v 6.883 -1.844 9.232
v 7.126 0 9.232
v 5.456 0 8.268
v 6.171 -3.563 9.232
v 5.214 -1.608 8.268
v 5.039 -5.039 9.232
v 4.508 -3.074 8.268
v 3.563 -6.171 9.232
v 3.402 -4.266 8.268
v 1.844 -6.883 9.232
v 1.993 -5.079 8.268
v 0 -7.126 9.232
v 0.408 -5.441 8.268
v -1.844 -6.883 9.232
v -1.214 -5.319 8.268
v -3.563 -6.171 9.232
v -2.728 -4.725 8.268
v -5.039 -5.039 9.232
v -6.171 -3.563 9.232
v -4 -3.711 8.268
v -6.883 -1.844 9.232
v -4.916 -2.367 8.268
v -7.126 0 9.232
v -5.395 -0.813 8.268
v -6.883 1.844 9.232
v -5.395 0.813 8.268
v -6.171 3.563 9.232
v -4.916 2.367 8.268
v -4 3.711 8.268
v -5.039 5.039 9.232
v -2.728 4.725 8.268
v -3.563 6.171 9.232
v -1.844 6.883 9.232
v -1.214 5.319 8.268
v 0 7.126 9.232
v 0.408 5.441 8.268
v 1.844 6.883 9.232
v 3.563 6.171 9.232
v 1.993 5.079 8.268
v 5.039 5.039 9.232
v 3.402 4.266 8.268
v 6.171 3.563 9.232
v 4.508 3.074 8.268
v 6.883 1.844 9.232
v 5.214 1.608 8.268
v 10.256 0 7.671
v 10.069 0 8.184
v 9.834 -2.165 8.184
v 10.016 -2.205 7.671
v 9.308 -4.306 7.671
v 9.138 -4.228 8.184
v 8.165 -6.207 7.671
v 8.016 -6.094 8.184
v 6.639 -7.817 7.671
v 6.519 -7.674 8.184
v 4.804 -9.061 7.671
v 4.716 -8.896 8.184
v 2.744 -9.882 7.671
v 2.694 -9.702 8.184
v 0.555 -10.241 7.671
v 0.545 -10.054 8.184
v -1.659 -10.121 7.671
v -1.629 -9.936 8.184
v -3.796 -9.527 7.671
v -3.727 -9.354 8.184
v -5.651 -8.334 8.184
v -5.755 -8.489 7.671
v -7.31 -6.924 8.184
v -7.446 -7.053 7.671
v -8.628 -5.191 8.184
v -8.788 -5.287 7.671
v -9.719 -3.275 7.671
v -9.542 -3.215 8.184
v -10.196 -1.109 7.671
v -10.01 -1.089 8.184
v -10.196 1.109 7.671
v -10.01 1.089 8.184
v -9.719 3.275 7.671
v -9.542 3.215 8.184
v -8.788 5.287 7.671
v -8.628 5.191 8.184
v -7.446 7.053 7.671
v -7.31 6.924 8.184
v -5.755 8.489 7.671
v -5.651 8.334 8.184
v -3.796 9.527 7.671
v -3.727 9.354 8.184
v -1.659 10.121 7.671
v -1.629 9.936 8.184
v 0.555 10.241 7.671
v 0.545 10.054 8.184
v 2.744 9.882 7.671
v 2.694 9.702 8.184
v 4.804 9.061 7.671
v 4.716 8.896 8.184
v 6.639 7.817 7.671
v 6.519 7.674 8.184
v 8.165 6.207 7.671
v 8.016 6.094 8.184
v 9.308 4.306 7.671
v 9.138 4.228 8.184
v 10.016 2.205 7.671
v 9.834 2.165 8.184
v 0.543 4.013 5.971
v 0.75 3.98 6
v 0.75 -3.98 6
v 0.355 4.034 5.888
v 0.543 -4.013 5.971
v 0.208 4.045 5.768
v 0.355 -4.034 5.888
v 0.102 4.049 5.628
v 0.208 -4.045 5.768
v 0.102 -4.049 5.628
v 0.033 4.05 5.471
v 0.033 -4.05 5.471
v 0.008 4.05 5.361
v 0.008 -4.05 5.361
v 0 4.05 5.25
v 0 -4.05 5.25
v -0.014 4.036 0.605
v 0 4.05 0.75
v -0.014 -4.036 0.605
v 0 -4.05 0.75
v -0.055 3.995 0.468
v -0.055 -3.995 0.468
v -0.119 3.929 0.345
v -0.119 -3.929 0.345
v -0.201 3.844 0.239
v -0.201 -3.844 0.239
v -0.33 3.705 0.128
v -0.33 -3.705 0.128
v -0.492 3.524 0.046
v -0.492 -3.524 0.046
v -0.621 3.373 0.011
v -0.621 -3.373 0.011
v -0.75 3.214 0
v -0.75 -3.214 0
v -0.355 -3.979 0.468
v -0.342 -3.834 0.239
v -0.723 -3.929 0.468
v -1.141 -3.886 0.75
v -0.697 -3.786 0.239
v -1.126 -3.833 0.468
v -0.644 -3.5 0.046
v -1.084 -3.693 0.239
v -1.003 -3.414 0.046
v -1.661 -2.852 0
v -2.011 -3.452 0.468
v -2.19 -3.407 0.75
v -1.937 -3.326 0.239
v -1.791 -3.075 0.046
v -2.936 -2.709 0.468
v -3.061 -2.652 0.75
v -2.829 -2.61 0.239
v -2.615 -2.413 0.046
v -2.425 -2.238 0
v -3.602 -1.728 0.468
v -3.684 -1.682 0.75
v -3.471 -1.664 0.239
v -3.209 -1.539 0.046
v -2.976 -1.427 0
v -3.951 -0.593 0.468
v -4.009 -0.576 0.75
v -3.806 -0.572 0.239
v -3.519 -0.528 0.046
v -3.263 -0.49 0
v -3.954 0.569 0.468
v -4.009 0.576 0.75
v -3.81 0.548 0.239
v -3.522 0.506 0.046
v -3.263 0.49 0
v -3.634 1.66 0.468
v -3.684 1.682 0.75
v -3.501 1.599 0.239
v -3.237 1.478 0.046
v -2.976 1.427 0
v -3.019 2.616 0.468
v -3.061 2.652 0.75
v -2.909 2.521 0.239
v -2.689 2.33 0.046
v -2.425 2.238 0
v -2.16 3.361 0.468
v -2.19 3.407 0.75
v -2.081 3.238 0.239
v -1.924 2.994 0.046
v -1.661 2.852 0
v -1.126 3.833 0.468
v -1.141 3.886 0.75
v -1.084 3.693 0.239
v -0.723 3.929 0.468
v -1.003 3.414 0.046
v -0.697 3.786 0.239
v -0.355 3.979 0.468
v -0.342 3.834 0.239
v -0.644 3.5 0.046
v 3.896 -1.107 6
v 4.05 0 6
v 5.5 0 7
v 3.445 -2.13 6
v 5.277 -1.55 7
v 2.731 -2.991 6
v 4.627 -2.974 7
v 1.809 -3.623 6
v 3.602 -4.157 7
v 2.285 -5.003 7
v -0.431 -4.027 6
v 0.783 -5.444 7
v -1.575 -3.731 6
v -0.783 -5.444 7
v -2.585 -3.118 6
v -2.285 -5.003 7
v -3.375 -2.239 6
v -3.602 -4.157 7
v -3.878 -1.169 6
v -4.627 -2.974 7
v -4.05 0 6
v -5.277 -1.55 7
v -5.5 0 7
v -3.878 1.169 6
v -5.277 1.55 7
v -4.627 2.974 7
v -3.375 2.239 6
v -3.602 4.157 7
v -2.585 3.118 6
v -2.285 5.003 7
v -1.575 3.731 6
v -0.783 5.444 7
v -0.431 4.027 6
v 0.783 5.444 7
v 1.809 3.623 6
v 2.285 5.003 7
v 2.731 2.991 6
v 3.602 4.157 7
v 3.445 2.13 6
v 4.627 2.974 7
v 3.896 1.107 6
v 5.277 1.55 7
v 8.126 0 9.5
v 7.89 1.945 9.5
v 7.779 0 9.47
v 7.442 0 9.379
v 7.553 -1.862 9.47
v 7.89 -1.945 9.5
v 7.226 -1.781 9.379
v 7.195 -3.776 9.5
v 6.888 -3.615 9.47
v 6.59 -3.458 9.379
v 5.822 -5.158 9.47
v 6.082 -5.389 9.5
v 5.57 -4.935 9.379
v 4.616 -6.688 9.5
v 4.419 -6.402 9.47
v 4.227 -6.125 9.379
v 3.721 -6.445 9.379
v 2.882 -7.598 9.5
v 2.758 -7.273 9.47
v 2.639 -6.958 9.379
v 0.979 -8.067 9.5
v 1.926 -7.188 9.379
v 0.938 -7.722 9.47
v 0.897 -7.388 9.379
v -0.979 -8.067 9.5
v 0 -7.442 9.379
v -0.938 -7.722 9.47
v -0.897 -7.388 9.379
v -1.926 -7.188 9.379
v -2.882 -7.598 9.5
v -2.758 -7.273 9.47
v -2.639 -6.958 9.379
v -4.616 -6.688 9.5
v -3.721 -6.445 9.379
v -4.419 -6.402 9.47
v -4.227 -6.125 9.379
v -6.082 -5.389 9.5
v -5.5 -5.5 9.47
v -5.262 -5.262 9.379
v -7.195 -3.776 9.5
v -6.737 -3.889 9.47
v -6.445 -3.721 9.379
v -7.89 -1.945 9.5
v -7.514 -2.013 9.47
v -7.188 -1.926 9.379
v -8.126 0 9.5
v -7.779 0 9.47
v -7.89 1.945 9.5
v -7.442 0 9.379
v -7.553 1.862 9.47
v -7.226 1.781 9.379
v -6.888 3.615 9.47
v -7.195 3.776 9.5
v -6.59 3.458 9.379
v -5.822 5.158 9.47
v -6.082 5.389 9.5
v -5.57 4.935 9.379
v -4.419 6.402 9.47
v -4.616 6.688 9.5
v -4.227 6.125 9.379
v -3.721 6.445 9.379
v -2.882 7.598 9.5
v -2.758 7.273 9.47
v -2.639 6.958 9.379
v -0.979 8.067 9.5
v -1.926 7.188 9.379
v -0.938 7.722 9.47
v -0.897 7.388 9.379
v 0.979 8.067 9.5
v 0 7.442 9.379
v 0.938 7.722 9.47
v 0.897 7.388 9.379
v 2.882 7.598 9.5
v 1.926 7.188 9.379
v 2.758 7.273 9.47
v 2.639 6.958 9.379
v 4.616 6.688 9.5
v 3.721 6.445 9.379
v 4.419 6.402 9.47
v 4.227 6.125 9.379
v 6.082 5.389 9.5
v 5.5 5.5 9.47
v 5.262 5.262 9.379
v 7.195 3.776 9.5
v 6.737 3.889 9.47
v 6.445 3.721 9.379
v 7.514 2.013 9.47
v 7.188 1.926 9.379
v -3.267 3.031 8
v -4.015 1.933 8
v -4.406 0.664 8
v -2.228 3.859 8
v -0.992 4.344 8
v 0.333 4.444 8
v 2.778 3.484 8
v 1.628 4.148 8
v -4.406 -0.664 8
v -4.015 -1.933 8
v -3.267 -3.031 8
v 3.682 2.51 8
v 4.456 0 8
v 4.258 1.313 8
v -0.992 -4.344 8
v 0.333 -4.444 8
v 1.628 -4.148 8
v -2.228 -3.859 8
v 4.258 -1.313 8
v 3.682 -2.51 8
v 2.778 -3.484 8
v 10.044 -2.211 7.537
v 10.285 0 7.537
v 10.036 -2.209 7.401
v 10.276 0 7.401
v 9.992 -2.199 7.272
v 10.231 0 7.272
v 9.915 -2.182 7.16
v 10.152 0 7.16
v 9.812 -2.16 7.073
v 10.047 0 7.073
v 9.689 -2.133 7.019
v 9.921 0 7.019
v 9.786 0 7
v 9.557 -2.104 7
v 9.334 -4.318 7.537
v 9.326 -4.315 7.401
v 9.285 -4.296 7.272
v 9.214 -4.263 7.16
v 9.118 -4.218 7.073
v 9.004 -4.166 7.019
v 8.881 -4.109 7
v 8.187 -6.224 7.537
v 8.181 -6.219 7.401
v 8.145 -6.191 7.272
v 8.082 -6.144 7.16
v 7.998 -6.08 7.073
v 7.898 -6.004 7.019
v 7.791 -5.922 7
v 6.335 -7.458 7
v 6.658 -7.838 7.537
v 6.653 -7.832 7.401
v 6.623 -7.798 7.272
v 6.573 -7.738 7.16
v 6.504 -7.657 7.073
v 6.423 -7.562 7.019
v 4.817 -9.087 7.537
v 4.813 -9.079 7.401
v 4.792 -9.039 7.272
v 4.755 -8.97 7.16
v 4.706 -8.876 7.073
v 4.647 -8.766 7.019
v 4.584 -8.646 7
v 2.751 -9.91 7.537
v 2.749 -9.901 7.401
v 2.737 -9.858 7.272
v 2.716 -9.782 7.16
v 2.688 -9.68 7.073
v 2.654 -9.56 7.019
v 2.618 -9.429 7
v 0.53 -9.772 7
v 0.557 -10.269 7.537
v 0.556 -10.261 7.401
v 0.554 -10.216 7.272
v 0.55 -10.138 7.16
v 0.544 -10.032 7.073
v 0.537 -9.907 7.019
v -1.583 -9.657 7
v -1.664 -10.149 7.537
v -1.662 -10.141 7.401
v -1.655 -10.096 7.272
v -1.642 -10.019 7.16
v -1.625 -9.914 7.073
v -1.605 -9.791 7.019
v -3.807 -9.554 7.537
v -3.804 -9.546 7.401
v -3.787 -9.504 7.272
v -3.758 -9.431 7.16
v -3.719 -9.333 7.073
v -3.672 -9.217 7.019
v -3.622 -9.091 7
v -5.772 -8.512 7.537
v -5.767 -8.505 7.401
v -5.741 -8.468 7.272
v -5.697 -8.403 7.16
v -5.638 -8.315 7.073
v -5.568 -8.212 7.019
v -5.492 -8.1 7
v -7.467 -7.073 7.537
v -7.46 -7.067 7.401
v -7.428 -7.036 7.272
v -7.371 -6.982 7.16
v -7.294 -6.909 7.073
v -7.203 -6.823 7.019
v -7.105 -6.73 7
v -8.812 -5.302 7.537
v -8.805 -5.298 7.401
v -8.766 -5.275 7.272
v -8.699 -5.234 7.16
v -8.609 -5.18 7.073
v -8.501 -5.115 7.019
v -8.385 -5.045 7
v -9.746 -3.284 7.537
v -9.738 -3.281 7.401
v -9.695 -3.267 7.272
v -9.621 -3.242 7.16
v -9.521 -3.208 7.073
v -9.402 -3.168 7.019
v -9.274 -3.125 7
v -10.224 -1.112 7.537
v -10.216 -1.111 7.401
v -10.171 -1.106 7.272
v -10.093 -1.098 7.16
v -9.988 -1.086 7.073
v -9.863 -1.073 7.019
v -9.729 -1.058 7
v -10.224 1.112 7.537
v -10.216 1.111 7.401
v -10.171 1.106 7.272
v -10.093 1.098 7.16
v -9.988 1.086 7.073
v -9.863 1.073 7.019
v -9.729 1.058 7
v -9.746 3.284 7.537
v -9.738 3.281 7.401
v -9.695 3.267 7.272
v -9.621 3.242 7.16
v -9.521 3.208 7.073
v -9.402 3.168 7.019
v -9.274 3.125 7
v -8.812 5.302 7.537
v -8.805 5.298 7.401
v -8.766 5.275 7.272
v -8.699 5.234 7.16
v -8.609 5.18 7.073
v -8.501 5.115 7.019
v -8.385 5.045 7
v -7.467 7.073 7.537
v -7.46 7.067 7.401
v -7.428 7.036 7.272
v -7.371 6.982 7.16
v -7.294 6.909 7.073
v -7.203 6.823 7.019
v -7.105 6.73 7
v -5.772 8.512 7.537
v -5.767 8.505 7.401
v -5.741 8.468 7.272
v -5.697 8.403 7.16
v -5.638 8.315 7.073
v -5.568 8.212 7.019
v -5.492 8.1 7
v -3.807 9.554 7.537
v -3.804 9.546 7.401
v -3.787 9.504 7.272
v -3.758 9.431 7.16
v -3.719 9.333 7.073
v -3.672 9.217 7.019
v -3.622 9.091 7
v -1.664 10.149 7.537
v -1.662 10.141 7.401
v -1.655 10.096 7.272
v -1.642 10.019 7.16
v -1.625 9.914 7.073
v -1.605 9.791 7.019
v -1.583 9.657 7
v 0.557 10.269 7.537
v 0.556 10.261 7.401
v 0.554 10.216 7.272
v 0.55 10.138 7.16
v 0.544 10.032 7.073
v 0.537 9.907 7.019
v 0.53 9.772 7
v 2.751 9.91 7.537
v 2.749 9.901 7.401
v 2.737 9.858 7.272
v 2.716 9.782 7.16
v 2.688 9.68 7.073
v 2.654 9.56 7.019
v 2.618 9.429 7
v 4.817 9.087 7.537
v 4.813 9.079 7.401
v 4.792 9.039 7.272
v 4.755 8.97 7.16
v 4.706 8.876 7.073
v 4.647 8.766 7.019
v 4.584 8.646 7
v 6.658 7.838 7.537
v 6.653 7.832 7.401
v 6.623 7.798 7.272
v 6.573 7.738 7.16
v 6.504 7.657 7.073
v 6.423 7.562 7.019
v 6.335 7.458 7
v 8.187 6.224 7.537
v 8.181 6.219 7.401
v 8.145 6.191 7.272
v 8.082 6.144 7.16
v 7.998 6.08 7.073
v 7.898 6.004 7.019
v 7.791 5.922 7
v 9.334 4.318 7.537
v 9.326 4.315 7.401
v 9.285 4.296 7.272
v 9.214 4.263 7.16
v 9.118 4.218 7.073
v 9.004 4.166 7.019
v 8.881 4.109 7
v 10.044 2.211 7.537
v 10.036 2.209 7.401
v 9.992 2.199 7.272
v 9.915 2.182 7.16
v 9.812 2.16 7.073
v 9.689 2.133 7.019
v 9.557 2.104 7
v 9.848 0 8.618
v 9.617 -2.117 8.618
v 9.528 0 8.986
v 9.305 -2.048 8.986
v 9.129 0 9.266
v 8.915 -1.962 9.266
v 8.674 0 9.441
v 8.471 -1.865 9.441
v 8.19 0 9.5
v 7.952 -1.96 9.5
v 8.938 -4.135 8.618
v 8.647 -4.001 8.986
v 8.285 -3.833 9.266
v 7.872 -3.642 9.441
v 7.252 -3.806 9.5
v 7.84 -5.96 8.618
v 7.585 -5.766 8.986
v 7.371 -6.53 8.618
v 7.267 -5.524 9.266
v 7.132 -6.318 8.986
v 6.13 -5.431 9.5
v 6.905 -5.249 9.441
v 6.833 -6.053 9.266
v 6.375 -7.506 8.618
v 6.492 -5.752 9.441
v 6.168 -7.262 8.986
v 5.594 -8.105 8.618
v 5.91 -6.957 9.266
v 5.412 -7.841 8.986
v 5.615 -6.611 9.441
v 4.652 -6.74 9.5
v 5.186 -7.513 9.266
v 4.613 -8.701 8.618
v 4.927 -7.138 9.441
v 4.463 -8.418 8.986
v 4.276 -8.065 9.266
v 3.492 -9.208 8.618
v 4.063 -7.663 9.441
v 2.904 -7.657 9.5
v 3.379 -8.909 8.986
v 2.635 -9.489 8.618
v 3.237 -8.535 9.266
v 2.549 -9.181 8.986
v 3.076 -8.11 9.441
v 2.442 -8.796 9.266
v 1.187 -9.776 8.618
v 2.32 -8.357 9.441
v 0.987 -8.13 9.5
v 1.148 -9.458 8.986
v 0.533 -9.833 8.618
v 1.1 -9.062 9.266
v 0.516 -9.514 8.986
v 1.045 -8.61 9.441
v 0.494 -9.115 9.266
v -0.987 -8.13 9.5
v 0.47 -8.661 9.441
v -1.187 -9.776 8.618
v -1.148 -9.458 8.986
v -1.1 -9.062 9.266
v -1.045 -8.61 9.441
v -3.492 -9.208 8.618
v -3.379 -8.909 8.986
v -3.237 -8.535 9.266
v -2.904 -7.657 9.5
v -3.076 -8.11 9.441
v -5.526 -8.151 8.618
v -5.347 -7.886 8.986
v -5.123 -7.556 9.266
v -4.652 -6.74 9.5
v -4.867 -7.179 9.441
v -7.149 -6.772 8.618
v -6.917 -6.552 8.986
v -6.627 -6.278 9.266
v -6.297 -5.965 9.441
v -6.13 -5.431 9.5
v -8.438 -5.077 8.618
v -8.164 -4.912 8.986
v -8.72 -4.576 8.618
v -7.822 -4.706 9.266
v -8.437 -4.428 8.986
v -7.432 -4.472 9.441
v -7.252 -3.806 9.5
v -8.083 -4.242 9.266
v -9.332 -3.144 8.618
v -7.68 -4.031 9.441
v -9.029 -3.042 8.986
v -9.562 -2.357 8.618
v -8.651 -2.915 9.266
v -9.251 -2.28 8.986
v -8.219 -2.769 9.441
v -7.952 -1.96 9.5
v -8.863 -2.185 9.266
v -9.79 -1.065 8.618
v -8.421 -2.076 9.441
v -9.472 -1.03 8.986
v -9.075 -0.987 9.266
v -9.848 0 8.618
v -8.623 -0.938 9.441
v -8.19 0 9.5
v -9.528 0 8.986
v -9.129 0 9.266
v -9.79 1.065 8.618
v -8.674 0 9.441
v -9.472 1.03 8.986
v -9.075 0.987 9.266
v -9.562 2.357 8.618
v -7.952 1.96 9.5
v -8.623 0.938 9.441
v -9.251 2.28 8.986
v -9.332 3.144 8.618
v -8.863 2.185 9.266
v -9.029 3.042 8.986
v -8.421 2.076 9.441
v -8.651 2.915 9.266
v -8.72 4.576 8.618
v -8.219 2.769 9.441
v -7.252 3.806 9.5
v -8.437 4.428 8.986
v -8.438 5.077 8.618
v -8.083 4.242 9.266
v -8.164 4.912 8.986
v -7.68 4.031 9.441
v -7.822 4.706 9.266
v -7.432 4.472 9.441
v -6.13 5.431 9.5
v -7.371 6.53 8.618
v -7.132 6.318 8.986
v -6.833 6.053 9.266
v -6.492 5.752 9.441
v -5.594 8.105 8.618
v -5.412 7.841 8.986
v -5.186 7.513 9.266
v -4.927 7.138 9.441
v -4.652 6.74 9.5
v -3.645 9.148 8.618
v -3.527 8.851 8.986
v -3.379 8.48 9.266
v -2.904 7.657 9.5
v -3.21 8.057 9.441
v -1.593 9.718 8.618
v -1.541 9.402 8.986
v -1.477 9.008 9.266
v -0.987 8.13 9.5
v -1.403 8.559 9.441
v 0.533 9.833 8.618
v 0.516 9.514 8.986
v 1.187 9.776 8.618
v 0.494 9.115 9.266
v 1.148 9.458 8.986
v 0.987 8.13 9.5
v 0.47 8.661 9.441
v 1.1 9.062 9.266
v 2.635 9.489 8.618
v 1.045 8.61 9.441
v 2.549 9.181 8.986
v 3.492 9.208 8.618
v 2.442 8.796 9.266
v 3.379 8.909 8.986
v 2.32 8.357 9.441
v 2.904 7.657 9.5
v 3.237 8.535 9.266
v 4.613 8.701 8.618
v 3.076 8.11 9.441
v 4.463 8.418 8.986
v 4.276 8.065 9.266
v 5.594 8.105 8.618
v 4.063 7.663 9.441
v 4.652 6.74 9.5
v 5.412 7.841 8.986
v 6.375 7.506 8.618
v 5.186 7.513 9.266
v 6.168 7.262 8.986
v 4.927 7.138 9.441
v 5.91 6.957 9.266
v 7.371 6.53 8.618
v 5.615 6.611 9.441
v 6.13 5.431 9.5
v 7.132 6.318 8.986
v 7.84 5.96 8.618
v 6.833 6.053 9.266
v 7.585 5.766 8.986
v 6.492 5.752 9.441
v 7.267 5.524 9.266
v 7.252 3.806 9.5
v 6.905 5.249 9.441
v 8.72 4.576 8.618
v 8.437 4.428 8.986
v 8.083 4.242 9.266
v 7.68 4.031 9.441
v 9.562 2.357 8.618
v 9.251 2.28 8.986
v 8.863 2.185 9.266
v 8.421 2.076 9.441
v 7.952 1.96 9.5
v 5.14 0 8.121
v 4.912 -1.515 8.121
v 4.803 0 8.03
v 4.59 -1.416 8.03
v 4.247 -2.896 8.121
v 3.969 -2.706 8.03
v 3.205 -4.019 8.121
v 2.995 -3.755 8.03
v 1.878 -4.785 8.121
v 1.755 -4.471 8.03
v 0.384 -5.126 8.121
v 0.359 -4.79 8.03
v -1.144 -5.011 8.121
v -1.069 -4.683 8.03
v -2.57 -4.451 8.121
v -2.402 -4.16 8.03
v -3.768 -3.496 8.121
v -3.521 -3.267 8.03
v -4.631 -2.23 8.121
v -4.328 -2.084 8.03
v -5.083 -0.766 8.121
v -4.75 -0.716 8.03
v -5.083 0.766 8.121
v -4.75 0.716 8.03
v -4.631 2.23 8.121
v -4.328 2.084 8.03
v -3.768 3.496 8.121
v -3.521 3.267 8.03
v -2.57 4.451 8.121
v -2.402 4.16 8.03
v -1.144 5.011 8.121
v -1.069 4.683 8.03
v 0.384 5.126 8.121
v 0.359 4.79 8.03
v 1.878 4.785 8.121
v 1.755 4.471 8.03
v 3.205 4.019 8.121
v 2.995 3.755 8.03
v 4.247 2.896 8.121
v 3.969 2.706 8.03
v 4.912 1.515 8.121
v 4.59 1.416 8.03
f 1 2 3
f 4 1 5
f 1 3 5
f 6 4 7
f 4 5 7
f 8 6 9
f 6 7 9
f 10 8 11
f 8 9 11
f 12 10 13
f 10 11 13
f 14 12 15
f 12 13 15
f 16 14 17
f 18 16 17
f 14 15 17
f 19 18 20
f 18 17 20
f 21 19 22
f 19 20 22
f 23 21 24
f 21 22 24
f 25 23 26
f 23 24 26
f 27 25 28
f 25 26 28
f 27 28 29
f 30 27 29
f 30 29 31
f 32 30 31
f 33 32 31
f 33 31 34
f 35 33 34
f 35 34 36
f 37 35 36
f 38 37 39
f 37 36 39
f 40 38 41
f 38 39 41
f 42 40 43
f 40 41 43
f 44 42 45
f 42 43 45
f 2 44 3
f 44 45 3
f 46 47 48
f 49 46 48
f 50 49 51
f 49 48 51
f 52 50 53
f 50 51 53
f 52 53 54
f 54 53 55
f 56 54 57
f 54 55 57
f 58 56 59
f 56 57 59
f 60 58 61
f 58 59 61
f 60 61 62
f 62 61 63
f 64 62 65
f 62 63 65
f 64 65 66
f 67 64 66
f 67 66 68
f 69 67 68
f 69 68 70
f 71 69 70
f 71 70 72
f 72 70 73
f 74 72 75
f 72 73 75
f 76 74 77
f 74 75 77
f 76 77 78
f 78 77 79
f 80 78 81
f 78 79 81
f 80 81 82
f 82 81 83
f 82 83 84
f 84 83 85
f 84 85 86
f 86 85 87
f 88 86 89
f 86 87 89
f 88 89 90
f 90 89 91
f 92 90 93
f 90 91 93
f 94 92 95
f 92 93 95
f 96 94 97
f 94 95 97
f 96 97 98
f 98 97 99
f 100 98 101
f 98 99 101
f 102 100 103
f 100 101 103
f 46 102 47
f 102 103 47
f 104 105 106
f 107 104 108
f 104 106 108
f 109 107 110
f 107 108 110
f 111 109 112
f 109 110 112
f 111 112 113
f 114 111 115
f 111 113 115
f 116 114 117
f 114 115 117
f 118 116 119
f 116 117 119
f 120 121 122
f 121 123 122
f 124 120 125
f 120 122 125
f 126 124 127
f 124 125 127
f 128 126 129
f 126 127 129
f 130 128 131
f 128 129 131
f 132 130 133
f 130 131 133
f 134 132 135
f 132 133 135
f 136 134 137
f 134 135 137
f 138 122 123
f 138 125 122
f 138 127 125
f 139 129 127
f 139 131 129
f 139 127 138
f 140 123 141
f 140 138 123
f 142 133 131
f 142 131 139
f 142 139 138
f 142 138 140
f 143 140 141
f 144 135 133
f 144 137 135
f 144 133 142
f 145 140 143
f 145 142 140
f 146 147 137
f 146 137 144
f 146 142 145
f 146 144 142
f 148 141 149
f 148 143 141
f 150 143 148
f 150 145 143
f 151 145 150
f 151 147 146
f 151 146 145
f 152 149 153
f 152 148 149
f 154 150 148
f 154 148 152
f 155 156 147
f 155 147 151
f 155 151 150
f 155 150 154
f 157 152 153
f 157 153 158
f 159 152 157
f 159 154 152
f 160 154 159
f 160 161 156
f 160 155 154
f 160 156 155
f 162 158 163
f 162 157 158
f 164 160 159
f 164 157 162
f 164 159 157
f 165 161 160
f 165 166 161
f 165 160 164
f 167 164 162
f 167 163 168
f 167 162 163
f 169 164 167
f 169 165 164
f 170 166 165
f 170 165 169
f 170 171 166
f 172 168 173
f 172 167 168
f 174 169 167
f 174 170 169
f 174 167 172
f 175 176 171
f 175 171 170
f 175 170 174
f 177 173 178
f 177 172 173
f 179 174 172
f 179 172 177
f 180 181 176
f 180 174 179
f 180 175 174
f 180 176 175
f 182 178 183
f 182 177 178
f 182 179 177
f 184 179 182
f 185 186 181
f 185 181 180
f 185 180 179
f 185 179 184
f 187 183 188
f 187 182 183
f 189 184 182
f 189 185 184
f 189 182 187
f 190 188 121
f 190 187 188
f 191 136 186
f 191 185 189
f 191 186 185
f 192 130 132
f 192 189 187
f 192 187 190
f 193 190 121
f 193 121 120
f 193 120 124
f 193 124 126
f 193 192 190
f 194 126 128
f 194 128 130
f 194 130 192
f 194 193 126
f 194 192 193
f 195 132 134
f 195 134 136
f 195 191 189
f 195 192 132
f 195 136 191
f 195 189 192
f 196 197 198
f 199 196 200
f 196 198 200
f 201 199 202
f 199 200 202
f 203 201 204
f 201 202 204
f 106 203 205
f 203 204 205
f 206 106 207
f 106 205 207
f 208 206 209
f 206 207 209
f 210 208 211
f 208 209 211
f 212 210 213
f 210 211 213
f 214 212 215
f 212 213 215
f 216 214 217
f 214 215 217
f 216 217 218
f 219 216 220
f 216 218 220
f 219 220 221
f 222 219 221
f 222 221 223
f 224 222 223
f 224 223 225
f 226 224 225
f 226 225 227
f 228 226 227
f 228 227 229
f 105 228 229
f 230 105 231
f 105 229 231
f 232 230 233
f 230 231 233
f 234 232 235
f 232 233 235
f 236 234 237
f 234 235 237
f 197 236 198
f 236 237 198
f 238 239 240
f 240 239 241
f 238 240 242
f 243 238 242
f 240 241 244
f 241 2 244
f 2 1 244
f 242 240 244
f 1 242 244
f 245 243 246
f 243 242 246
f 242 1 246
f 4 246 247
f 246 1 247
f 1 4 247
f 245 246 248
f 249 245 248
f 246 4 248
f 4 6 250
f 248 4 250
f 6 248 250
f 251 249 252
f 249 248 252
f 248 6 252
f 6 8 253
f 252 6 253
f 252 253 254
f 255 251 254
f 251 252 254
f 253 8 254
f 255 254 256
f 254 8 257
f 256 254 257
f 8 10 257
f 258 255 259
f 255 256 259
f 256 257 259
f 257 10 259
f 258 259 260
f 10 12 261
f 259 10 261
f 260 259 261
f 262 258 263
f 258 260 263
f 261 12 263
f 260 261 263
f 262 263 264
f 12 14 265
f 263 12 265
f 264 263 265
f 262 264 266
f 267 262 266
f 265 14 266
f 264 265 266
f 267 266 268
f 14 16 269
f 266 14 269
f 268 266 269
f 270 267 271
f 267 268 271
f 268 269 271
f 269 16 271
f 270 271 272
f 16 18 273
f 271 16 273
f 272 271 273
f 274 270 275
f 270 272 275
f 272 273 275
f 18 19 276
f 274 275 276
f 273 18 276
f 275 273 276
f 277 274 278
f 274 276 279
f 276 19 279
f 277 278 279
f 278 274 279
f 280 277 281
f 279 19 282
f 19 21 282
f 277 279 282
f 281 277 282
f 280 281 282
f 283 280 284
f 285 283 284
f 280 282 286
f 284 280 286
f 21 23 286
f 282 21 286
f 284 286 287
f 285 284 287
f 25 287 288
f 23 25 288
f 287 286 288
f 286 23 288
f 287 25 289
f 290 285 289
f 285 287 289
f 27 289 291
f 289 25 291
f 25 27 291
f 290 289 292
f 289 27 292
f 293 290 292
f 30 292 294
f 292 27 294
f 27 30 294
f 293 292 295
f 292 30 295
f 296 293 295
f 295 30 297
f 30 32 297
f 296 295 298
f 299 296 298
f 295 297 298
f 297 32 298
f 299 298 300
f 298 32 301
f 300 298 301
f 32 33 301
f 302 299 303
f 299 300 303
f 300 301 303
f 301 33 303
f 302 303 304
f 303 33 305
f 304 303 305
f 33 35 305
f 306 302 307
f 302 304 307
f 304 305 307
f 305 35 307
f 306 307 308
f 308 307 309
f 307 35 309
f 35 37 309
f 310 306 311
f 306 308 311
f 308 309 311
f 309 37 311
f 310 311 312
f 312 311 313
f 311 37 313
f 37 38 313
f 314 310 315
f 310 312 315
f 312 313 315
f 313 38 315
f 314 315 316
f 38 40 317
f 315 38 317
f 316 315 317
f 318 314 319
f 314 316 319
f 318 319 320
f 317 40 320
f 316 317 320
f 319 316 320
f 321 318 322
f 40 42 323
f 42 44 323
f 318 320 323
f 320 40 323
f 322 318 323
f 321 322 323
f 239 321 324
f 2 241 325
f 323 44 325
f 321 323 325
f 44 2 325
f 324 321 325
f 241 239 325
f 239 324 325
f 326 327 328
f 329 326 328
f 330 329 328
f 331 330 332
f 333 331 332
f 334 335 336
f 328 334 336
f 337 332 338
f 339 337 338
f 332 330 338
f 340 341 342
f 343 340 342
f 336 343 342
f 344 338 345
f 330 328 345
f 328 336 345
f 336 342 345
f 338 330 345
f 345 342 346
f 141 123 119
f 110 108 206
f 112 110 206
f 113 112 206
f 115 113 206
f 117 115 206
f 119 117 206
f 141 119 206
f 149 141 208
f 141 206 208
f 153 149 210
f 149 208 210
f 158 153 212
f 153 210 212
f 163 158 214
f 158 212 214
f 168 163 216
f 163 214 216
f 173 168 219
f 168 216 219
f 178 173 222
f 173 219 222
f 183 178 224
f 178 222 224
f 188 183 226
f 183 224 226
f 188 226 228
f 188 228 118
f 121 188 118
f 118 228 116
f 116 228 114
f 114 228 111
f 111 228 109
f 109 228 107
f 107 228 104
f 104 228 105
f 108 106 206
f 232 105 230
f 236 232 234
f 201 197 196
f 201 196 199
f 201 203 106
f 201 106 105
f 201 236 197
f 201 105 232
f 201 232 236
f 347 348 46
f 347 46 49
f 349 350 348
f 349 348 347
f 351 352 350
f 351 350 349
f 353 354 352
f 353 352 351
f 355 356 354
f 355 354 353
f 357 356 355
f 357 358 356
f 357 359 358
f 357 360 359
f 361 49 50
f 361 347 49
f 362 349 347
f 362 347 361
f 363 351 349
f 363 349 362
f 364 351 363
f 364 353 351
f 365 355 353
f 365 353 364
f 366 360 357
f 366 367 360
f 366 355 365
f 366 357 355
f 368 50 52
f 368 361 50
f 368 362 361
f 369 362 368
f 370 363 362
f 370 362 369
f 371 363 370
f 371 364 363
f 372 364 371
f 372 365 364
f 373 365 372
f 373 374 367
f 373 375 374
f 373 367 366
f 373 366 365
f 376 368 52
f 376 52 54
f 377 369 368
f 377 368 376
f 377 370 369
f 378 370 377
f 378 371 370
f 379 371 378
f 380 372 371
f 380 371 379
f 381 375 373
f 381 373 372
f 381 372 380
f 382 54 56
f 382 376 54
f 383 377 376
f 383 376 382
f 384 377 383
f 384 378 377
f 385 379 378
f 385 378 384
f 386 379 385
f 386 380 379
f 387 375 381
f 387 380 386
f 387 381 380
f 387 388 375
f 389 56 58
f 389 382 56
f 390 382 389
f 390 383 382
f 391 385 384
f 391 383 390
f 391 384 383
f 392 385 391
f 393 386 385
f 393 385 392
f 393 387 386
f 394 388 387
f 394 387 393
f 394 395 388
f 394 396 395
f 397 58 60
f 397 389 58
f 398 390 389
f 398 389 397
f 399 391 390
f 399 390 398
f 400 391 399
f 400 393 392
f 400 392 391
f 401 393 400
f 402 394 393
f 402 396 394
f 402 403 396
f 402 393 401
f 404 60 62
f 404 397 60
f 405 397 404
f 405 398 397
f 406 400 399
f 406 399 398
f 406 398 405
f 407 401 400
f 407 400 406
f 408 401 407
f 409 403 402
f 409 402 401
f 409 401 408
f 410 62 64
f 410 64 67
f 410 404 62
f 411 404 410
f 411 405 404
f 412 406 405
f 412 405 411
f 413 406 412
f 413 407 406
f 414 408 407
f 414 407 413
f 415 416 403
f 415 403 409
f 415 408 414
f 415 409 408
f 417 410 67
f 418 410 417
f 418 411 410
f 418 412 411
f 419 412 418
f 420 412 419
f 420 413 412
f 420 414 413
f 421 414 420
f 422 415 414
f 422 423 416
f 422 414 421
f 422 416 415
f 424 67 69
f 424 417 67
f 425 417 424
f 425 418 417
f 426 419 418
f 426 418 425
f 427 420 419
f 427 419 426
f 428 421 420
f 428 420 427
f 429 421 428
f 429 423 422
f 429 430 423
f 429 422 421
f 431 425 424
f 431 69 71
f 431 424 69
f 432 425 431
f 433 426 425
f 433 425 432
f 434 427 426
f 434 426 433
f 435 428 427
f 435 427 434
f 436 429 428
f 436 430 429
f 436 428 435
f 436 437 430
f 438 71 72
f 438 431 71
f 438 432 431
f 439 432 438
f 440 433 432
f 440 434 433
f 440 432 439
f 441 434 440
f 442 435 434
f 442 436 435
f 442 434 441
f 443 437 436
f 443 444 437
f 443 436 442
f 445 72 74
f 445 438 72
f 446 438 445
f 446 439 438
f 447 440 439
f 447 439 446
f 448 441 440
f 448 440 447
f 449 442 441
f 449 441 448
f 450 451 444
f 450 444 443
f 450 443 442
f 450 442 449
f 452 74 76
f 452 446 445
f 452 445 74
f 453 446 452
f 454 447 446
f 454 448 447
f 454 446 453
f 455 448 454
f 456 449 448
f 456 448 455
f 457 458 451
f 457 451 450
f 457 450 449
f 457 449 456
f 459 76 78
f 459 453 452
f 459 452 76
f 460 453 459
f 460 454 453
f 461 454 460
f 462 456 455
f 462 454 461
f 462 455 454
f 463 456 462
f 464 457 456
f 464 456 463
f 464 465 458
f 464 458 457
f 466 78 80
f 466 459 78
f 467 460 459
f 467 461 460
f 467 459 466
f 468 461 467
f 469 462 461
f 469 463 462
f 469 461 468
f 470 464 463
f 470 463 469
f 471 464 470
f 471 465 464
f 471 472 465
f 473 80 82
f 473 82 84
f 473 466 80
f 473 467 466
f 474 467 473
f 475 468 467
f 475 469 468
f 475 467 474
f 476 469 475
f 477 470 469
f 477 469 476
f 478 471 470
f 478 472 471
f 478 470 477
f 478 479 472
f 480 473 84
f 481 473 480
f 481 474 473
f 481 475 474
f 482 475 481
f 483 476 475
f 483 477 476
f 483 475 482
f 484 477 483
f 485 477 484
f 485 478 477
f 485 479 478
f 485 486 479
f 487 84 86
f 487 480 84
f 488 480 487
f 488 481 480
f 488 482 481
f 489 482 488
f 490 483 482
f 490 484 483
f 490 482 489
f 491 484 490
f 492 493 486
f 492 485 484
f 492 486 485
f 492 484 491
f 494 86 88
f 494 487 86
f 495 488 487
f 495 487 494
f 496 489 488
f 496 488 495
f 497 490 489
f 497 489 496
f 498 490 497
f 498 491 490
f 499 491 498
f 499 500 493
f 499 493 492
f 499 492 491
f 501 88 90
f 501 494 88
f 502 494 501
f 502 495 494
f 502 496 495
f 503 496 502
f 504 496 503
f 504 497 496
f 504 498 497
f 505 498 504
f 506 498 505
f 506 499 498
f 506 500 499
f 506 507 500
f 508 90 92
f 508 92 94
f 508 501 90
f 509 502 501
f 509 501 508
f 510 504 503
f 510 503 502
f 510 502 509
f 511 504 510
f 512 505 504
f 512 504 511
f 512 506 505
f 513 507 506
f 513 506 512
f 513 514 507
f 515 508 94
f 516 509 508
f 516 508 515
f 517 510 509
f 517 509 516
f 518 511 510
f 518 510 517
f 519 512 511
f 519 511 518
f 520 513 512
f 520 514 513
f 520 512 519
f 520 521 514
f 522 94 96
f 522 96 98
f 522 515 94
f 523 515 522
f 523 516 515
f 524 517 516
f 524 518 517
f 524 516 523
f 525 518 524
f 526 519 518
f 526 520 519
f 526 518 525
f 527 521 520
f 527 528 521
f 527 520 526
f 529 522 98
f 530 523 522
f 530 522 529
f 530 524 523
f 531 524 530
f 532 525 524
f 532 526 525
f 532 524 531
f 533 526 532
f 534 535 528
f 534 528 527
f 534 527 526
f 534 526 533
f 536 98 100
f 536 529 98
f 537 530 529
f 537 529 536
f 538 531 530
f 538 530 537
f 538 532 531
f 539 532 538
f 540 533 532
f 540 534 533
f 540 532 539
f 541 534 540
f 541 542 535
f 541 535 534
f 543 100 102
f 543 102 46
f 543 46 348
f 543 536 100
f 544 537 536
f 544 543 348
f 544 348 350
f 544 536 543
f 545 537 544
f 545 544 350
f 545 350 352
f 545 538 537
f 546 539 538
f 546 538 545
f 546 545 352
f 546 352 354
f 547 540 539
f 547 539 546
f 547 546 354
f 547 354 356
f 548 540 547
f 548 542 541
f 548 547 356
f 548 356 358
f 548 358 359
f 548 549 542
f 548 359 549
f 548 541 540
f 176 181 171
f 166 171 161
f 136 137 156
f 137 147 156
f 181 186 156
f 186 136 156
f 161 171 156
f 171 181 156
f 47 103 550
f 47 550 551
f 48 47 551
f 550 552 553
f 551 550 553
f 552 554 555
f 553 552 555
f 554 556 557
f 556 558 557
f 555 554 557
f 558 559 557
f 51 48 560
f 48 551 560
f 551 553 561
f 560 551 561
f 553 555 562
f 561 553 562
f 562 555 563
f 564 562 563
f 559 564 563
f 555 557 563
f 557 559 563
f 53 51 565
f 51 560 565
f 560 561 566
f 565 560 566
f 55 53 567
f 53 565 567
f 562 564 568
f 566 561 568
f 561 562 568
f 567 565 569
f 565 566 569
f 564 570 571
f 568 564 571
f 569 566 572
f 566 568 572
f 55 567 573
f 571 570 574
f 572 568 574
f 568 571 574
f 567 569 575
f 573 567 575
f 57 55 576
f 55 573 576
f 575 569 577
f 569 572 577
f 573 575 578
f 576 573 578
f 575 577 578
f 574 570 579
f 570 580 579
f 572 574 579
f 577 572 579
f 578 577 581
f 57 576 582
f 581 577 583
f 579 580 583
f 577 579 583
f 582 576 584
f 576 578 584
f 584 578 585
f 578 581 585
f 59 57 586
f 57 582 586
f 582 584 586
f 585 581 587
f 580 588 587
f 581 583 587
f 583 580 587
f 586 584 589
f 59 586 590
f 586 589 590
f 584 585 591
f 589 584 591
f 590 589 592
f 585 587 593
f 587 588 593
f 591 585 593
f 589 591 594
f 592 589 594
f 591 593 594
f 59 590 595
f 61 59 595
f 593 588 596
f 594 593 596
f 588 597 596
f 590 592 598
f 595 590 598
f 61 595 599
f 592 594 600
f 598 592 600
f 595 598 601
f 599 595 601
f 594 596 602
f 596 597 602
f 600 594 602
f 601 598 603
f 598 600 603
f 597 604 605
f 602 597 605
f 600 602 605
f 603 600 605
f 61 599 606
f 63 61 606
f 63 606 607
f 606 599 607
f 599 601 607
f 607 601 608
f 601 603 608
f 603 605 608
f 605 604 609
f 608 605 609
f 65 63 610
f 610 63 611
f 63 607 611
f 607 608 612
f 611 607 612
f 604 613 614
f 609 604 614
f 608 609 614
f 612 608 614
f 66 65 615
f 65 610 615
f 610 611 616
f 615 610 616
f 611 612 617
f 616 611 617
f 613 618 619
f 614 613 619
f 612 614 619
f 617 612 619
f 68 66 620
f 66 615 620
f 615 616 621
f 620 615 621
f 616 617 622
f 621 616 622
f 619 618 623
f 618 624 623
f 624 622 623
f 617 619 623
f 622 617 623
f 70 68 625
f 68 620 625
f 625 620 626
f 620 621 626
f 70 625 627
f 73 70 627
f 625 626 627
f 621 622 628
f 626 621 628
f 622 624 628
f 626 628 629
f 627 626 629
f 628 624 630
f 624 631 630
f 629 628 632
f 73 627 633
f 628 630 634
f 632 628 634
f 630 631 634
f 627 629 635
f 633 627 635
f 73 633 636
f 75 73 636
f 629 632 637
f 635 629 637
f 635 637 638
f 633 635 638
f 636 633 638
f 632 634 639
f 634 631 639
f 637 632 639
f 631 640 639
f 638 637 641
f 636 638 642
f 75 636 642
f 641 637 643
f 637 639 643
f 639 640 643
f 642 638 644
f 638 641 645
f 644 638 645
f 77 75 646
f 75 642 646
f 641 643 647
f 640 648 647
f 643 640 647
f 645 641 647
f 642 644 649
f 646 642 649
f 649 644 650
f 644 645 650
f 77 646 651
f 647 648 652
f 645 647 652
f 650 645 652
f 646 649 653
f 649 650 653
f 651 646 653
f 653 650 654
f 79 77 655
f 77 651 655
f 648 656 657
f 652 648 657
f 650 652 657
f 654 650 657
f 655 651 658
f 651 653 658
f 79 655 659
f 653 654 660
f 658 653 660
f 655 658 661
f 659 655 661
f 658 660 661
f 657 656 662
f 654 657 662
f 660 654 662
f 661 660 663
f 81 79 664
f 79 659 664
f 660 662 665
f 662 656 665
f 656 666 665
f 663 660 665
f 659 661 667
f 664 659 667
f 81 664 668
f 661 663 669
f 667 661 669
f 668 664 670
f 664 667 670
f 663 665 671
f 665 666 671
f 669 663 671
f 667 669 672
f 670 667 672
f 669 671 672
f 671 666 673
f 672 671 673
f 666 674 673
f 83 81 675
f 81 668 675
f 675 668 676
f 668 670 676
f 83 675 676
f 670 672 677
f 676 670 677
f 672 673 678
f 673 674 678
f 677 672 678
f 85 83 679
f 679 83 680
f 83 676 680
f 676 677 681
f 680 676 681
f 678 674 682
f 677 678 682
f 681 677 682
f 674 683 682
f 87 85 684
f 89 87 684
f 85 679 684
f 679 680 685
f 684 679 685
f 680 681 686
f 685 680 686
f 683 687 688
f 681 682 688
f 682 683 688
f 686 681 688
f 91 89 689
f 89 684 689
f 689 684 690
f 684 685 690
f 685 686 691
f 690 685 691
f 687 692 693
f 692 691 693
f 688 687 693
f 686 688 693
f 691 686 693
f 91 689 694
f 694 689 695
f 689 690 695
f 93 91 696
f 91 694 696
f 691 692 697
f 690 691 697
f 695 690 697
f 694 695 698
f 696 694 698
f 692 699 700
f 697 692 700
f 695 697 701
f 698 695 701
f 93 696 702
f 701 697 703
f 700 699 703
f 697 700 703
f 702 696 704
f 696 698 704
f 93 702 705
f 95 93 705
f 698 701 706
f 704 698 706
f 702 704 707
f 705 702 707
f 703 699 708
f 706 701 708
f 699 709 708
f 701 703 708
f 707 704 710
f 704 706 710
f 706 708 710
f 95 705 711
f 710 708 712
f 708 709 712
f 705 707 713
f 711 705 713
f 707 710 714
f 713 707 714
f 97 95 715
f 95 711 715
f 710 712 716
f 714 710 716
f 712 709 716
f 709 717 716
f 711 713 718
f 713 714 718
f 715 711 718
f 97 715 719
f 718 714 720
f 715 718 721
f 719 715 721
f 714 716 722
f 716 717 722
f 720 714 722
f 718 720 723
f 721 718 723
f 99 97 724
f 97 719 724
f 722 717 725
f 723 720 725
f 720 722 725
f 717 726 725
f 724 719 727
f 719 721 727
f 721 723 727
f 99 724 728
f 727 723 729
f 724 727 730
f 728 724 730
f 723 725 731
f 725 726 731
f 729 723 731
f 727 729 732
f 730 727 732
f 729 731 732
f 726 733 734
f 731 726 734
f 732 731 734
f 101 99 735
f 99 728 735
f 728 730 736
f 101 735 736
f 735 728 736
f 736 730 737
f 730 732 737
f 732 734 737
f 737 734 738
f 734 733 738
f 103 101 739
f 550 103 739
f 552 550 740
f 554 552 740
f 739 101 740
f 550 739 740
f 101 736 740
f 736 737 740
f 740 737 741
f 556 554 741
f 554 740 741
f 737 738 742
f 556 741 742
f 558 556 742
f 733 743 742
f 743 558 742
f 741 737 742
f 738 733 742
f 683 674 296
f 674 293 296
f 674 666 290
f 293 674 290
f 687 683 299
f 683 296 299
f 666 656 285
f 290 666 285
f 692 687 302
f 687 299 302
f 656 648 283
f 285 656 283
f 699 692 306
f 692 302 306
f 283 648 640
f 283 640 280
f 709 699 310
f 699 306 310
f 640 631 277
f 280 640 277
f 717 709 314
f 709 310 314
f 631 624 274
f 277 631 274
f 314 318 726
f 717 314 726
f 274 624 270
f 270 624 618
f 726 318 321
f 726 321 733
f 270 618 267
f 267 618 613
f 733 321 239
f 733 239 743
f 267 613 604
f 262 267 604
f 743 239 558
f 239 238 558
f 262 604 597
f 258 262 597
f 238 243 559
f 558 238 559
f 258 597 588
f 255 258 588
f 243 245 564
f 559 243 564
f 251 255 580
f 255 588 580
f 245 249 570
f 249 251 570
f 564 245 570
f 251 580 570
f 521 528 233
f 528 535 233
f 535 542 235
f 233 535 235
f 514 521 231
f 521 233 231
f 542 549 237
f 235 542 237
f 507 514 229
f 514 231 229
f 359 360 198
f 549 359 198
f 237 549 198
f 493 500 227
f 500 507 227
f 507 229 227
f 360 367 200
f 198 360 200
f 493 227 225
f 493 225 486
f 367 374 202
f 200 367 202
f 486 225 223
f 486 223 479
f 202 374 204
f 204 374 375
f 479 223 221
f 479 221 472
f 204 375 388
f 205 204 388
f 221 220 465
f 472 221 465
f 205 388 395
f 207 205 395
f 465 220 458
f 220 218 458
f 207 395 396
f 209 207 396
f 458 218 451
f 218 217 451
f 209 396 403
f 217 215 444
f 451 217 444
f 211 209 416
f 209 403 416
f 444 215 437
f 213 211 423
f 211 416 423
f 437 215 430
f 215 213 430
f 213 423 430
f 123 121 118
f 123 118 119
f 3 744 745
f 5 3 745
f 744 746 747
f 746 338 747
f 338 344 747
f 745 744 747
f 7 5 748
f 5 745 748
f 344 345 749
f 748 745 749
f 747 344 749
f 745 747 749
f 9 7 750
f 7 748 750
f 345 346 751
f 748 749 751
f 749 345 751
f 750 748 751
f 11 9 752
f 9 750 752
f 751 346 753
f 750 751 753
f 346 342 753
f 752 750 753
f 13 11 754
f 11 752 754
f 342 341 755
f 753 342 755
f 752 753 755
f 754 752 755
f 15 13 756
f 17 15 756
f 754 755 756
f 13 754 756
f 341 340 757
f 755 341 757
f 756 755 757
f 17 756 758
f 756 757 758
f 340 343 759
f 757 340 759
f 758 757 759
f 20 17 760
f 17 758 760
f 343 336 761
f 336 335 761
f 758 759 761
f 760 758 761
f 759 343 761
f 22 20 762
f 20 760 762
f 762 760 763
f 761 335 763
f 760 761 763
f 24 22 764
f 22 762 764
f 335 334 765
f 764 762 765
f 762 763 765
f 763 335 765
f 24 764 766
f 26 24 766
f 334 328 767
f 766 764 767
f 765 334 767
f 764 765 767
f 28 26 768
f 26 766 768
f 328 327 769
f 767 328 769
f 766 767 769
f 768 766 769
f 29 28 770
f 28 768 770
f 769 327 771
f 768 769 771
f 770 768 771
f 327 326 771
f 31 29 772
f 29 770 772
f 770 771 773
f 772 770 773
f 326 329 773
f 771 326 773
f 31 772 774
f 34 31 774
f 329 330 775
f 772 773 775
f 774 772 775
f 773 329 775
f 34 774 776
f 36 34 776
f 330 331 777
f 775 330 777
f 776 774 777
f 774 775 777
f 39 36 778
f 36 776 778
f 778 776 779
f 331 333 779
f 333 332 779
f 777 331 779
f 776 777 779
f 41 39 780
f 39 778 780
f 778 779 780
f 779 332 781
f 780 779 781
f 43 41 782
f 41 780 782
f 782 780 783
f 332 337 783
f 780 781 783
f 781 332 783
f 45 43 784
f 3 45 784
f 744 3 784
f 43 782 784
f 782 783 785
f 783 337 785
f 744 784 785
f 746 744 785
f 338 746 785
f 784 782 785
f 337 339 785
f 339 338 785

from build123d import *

# Parameters (mm, degrees)
F2_W     = 4.05
F2_H     = 8.1
F3_DEPTH = 6
F4_R     = 0.75
F5_R     = 2
F6_R     = 0.5


with BuildPart() as f1:
    # F0 (on Front) → F1 (revolve)
    with BuildSketch(Plane.XZ):
        Polygon((4.05, 0), (4.05, 6), (5.5, 7), (10.5, 7), (9.5900744143, 9.5), (7.5900744143, 9.5), (4.991998203, 8), (0, 8), (0, 0), align=None)
    revolve(axis=Axis((0, 0, 4), (0, 0, -1)))

    # F2 (on face) → F3 (cut)
    with BuildSketch(Plane(origin=(0, 0, 0), x_dir=(1, 0, 0), z_dir=(0, 0, -1))):
        with Locations((2.025, 0)):
            Rectangle(F2_W, F2_H)
    extrude(amount=-F3_DEPTH, mode=Mode.SUBTRACT)

    # F4
    f4_edges = [f1.edges().sort_by_distance(p)[0] for p in [
        (0, 0, 0),
        (0, 0, 6),
        (-4.05, 0, 0),
    ]]
    fillet(f4_edges, radius=F4_R)

    # F5
    f5_edges = [f1.edges().sort_by_distance(p)[0] for p in [
        (-9.590074, 0, 9.5),
        (-7.590074, 0, 9.5),
        (-4.991998, 0, 8),
    ]]
    fillet(f5_edges, radius=F5_R)

    # F6
    f6_edges = [f1.edges().sort_by_distance(p)[0] for p in [
        (-10.5, 0, 7),
    ]]
    fillet(f6_edges, radius=F6_R)


solid = f1.part
